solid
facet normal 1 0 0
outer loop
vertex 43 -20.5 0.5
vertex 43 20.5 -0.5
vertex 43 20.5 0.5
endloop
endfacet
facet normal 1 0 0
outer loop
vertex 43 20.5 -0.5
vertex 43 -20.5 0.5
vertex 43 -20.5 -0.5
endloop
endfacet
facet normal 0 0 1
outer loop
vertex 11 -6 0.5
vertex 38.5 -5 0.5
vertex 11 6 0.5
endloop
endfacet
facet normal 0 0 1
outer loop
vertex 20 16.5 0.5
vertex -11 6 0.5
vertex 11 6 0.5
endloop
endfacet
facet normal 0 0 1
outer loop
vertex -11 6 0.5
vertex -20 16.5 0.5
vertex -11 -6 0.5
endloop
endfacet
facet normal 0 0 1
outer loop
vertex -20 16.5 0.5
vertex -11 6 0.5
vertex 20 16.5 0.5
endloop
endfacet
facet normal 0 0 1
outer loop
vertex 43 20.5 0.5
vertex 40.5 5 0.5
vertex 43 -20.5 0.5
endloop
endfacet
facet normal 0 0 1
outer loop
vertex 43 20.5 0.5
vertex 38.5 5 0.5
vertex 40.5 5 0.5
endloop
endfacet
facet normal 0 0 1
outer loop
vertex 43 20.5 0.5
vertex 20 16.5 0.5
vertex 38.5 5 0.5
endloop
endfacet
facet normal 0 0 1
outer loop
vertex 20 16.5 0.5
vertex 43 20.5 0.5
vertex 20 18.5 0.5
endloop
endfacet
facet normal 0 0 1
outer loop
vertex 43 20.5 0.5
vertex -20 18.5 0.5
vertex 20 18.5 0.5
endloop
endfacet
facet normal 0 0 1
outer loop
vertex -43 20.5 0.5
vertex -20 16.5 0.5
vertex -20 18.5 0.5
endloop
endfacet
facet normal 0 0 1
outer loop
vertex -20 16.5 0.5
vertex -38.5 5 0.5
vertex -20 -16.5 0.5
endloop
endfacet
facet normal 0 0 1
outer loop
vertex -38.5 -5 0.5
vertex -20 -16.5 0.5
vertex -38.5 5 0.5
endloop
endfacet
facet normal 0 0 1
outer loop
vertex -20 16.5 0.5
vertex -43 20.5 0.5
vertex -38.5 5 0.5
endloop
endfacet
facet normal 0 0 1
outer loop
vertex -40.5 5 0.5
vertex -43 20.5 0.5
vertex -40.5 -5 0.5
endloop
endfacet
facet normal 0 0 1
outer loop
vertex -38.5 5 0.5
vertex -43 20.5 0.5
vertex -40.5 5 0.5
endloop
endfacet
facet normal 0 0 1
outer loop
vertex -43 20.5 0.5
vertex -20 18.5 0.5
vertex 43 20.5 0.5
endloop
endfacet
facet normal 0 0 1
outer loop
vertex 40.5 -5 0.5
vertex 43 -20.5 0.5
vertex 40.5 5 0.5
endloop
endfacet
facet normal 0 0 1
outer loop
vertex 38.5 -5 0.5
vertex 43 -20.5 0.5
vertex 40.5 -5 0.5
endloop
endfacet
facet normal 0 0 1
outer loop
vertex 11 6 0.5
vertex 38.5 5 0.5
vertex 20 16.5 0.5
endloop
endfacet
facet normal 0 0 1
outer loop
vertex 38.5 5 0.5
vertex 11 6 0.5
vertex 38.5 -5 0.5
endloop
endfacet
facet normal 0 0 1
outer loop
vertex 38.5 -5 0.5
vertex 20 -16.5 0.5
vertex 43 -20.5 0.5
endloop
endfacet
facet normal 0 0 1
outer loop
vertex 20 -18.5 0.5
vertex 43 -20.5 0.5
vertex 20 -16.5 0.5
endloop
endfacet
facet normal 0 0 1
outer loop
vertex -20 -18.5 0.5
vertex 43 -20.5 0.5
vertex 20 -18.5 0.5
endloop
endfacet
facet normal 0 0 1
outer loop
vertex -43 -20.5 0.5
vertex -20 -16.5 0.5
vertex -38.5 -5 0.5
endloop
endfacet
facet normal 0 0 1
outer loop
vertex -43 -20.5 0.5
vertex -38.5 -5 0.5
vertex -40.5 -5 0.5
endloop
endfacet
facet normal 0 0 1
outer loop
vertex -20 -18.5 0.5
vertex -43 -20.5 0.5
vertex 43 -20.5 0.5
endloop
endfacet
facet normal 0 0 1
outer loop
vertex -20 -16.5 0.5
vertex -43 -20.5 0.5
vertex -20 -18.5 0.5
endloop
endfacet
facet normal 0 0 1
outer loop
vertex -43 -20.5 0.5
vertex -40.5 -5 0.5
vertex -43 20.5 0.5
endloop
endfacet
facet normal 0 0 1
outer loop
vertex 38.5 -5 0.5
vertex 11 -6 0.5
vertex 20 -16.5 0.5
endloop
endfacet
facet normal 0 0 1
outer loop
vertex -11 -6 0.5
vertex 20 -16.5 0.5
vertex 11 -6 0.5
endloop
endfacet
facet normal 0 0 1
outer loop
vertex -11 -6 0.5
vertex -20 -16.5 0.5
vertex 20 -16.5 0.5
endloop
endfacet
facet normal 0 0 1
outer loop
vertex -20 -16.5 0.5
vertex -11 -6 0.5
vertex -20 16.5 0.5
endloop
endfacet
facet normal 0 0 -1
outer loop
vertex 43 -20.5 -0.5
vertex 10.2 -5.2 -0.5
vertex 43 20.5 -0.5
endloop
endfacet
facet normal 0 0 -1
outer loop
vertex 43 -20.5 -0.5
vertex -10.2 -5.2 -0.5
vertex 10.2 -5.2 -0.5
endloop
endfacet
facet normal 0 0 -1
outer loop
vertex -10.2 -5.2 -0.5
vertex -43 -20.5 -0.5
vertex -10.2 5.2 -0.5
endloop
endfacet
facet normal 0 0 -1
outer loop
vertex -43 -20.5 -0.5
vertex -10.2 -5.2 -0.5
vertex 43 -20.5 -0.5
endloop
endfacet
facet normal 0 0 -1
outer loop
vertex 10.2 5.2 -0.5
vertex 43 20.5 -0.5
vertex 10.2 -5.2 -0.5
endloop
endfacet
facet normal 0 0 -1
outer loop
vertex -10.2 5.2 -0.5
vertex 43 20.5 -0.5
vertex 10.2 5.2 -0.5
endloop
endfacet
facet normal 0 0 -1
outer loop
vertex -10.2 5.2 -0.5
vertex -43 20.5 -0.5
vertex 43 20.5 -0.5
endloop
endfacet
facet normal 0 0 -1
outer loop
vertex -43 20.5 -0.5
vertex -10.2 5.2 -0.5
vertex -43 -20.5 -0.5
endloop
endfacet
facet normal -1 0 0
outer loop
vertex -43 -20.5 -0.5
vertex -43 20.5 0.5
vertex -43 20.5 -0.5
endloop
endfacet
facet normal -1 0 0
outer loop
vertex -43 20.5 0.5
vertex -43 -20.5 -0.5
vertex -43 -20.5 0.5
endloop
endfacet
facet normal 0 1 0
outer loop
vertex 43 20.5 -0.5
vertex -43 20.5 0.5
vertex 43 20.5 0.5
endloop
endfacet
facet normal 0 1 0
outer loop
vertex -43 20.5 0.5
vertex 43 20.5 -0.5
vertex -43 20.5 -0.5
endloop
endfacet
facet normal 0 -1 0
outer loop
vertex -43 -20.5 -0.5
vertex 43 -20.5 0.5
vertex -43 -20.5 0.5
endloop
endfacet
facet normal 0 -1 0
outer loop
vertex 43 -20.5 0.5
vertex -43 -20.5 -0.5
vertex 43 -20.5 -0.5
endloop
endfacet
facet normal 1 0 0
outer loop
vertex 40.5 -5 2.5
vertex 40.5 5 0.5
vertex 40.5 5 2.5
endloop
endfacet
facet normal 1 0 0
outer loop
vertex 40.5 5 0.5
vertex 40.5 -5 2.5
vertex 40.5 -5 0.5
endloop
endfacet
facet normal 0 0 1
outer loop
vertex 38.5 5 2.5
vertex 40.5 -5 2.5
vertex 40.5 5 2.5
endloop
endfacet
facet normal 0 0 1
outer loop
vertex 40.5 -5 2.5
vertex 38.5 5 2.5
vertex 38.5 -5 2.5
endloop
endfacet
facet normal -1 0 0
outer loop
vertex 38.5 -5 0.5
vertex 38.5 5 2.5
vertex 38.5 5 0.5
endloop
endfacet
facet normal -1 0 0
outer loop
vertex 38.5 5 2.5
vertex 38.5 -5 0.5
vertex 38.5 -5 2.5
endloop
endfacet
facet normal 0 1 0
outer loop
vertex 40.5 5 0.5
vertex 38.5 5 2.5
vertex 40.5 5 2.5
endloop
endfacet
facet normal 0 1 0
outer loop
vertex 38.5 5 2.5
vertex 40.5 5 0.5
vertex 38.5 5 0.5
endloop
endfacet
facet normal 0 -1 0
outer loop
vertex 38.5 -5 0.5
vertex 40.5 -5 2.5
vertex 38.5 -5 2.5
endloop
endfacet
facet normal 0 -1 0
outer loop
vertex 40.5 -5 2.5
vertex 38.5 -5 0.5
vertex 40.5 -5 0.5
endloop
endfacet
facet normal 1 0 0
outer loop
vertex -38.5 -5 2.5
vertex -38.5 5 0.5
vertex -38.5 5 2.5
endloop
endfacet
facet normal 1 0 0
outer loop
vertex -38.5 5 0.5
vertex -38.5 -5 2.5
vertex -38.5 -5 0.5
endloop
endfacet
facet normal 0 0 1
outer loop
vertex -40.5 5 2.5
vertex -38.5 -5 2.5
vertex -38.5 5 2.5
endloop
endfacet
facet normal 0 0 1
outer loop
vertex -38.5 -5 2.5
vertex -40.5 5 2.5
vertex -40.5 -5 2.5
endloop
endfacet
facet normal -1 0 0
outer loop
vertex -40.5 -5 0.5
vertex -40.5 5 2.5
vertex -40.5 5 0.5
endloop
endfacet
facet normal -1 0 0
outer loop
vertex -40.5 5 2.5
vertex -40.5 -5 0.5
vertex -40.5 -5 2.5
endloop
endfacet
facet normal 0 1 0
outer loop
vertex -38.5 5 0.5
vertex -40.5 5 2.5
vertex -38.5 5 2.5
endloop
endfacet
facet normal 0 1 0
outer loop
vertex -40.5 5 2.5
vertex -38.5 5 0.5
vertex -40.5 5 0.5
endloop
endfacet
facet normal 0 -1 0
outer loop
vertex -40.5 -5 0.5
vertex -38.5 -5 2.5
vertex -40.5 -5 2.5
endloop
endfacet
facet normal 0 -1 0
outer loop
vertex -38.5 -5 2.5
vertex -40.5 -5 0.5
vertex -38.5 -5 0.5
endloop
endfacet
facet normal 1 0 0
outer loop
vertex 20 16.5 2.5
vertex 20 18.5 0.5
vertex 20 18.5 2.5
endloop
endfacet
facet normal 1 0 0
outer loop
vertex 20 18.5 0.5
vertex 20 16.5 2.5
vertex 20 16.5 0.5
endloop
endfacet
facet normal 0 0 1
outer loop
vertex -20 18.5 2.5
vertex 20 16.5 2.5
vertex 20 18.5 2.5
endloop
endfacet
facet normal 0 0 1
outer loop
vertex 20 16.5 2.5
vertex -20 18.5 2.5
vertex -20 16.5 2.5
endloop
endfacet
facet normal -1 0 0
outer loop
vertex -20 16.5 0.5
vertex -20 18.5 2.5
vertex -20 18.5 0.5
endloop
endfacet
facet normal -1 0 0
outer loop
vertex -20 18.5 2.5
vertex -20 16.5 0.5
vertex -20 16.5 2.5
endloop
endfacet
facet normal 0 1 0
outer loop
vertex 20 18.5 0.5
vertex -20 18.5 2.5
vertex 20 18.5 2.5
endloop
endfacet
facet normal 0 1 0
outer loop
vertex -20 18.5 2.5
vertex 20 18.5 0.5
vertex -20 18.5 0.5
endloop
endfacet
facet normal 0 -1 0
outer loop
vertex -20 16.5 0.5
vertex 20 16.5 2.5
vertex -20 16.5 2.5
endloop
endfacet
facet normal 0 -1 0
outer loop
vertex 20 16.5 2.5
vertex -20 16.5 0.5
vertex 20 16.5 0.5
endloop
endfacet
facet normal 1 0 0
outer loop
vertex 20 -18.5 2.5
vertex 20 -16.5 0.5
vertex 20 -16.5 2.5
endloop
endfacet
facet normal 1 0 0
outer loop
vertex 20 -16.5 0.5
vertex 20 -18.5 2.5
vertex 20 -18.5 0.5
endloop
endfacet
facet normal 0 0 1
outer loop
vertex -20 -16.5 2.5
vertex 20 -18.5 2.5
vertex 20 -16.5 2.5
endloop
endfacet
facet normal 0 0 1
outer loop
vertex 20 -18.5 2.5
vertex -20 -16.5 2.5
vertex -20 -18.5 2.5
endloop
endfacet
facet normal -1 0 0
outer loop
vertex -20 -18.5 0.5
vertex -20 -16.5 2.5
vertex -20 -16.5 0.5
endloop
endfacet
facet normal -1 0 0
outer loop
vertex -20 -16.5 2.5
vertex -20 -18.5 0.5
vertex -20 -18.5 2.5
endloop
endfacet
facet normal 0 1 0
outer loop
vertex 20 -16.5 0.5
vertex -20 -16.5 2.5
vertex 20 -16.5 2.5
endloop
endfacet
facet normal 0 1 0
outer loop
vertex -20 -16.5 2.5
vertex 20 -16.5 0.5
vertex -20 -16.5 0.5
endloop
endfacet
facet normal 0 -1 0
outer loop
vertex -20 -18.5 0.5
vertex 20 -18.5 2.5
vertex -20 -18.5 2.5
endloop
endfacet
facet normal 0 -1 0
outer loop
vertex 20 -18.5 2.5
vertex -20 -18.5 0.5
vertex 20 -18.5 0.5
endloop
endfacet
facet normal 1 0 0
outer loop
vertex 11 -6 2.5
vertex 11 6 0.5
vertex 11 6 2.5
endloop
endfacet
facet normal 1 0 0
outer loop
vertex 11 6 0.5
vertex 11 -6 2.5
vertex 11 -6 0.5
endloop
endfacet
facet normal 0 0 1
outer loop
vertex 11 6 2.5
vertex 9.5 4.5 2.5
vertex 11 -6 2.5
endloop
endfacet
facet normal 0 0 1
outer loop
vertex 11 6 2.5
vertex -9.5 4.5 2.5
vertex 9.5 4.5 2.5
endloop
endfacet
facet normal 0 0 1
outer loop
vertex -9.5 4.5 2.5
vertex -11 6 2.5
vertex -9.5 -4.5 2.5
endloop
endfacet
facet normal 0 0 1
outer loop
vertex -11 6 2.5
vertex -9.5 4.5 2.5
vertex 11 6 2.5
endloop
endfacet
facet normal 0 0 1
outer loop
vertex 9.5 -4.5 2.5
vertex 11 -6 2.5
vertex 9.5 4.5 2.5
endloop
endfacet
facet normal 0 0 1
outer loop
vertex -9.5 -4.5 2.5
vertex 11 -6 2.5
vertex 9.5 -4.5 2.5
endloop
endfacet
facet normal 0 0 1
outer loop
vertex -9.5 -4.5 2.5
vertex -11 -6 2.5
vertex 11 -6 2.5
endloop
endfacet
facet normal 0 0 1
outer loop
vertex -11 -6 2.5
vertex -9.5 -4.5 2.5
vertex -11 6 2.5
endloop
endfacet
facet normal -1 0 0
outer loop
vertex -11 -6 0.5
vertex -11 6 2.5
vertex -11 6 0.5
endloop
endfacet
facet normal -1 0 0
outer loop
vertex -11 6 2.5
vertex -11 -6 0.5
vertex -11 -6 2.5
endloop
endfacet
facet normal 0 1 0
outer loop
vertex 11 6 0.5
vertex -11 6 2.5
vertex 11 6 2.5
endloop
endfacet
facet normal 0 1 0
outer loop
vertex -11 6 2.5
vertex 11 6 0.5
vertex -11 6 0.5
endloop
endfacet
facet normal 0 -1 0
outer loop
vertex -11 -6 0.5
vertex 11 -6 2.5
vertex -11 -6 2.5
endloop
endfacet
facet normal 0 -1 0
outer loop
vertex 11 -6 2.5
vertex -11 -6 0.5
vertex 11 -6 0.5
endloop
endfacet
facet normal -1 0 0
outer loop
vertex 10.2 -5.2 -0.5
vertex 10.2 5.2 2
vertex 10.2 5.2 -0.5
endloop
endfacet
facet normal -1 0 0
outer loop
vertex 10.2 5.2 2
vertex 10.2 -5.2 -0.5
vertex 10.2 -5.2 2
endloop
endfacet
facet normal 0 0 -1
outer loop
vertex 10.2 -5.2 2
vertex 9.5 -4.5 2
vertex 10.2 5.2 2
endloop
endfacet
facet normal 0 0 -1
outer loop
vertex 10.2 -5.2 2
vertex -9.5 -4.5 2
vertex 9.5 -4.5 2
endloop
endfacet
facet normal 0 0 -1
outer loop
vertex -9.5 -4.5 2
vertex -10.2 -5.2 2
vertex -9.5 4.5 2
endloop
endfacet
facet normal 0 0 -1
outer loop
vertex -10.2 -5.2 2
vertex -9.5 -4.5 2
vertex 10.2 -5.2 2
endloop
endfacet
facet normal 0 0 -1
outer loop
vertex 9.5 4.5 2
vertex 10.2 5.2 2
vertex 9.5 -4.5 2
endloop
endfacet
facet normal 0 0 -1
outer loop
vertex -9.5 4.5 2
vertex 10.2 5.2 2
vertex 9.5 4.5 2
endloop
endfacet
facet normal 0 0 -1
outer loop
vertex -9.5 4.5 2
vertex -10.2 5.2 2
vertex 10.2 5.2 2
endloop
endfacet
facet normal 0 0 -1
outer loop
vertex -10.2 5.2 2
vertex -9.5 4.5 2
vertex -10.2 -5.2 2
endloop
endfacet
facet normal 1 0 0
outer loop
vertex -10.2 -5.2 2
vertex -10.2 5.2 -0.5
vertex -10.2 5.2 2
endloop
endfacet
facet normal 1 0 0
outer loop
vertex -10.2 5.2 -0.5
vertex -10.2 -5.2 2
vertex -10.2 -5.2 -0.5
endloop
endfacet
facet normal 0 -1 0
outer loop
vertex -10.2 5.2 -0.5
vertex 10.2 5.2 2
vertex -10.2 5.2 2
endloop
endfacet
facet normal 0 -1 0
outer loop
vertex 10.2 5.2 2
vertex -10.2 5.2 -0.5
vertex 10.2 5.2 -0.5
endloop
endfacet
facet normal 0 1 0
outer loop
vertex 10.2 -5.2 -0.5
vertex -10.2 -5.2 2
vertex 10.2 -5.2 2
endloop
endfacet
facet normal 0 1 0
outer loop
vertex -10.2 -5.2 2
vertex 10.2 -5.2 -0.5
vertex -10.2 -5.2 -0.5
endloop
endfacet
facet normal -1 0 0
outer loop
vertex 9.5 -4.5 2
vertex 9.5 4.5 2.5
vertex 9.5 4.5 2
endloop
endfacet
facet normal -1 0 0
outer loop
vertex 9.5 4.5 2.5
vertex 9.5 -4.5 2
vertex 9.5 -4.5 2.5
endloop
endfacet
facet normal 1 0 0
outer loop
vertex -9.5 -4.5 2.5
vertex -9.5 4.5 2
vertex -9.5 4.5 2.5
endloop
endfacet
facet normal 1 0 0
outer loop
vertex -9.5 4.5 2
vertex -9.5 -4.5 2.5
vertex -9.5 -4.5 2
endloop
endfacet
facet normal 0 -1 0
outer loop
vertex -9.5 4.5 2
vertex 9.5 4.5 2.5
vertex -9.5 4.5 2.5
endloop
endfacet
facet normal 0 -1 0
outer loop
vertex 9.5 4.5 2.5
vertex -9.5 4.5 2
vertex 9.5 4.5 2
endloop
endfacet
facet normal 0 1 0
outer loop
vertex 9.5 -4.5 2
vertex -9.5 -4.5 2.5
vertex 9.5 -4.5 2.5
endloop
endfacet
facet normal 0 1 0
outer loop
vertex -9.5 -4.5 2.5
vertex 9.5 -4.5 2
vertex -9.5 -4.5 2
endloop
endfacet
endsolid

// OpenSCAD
//$fn=60;
$fa=5;
$fs=.4;

difference(){
    base_box();
    cube([20.4,10.4,4],center=true);
    cube([19,9,10],center=true);
}


module base_box(){
    union() {
        cube([86,41,1],center=true);
        translate([-1+81/2,0,1]) cube([2,10,3],center=true);
        translate([1-81/2,0,1]) cube([2,10,3],center=true);
        translate([0,-1+37/2,1]) cube([40,2,3],center=true);
        translate([0,1-37/2,1]) cube([40,2,3],center=true);
        translate([0,0,1]) cube([22,12,3],center=true);
    }
}
/*
difference(){
    union(){
        base_box();
        translate([0,18,0]) cylinder(d=8,h=2);
        translate([50,18,0]) cylinder(d=8,h=2);
        translate([20,-5,0]) cube([20,10,8]);
    }
    translate([0,18,0]) cylinder(d=3,h=5);
    translate([50,18,0]) cylinder(d=3,h=5);
    translate([21.5,-15,20]) cube([17,20,15]);
    translate([10,60,7]) cube([38,20,25]);
    translate([5,-15,25]) cube([7,20,15]);
}

module base_box(){
    difference(){
        linear_extrude(height=30) hull(){
                circle(r=10);
                translate([50,0,0]) circle(r=10);
                translate([0,60,0]) circle(r=10);
                translate([50,60,0]) circle(r=10);
        }
        translate([1,1,1]) linear_extrude(height=40) 
            hull(){
                circle(r=9);
                translate([48,0,0]) circle(r=9);
                translate([0,58,0]) circle(r=9);
                translate([48,58,0]) circle(r=9);
            }
    }
}
*/
